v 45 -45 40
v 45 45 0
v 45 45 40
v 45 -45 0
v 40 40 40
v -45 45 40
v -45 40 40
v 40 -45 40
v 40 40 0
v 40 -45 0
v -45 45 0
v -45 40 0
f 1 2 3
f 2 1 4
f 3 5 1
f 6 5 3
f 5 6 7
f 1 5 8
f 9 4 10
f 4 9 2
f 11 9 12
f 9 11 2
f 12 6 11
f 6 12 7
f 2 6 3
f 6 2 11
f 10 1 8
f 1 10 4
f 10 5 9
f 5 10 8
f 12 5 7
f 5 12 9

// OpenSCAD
// DIY Magnetic Stirrer Housing
// Based on an 80mm PC case fan
// Print orientation: Upside down (Top plate on bed, walls rising up)
// Centred on Origin (X=0, Y=0)

// --- Dimensions ---
// Outer dimensions
W_OUT = 90;
H_OUT = 90;
// Thicknesses
T_TOP = 2;
T_WALL = 2.5;
// Height of walls (total height from bed to open top)
H_WALL = 40;
// Hole pattern for M4 screws
PATTERN_SIZE = 71.5;
D_HOLE = 4.5;
// Cable notch
NOTCH_W = 12;
NOTCH_H = 8; // Depth from open edge (z = 40 - 8 = 32)

// --- Configuration ---
$fn = 128; // High resolution for smooth curves and precise holes

// --- Construction ---
// We build the solid volume first, then subtract voids, holes, and notches.
// The entire assembly is translated to be centered on the origin.

difference() {
    // 1. Main Solid Block
    // Represents the material of the top plate and the 4 walls.
    // Dimensions: W_OUT x H_OUT x H_WALL
    translate([-W_OUT/2, -H_OUT/2, 0])
        cube([W_OUT, H_OUT, H_WALL], center = false);
    
    // 2. Internal Void
    // The empty space inside the box.
    // Width = 90 - 2*2.5 = 85
    // Height = 90 - 2*2.5 = 85
    // Depth = 40 (from z=0 to z=40)
    translate([-W_OUT/2, -H_OUT/2, 0])
        cube([W_OUT - 2*T_WALL, H_OUT - 2*T_WALL, H_WALL], center = false);
    
    // 3. Screw Holes
    // 4 holes on a 71.5mm square pattern centered on the plate (which is centered on origin).
    // Pattern center is (0,0).
    // Offsets: +/- 71.5/2 = +/- 35.75
    // Z position: Through the top plate (z=0 to z=2).
    // Extend slightly past z=2 to ensure clean cut.
    translate([-W_OUT/2, -H_OUT/2, 0]) {
        for (i = [-1, 1]) {
            for (j = [-1, 1]) {
                translate([
                    i * (PATTERN_SIZE / 2),
                    j * (PATTERN_SIZE / 2),
                    0
                ]) 
                    cylinder(
                        h = T_TOP + 0.1, // Extend slightly past top plate
                        d = D_HOLE,
                        center = false
                    );
            }
        }
    }
    
    // 4. Cable Notch
    // Located in one wall. Let's pick the wall at the negative Y side (front).
    // Wall Y position (center of the wall thickness):
    // Bottom of part is -45. Top of wall is -45 + 2.5 = -42.5.
    // Center of wall = -45 + 1.25 = -43.75.
    // Notch is centered along this wall (X=0).
    // Notch cuts INTO the wall from the open top (z=40) downwards.
    
    // Calculate the Y coordinate of the center of the front wall
    y_wall_center = -H_OUT/2 + T_WALL/2;
    
    // Notch geometry relative to the part's local coordinates:
    // X: Centered at 0, width NOTCH_W
    // Y: Centered at y_wall_center, width NOTCH_W (cuts through the wall thickness)
    // Z: From (40 - NOTCH_H) to 40
    
    translate([-W_OUT/2, -H_OUT/2, 0])
        translate([0, y_wall_center, 40 - NOTCH_H])
            cube([NOTCH_W, T_WALL, NOTCH_H], center = false);
}
